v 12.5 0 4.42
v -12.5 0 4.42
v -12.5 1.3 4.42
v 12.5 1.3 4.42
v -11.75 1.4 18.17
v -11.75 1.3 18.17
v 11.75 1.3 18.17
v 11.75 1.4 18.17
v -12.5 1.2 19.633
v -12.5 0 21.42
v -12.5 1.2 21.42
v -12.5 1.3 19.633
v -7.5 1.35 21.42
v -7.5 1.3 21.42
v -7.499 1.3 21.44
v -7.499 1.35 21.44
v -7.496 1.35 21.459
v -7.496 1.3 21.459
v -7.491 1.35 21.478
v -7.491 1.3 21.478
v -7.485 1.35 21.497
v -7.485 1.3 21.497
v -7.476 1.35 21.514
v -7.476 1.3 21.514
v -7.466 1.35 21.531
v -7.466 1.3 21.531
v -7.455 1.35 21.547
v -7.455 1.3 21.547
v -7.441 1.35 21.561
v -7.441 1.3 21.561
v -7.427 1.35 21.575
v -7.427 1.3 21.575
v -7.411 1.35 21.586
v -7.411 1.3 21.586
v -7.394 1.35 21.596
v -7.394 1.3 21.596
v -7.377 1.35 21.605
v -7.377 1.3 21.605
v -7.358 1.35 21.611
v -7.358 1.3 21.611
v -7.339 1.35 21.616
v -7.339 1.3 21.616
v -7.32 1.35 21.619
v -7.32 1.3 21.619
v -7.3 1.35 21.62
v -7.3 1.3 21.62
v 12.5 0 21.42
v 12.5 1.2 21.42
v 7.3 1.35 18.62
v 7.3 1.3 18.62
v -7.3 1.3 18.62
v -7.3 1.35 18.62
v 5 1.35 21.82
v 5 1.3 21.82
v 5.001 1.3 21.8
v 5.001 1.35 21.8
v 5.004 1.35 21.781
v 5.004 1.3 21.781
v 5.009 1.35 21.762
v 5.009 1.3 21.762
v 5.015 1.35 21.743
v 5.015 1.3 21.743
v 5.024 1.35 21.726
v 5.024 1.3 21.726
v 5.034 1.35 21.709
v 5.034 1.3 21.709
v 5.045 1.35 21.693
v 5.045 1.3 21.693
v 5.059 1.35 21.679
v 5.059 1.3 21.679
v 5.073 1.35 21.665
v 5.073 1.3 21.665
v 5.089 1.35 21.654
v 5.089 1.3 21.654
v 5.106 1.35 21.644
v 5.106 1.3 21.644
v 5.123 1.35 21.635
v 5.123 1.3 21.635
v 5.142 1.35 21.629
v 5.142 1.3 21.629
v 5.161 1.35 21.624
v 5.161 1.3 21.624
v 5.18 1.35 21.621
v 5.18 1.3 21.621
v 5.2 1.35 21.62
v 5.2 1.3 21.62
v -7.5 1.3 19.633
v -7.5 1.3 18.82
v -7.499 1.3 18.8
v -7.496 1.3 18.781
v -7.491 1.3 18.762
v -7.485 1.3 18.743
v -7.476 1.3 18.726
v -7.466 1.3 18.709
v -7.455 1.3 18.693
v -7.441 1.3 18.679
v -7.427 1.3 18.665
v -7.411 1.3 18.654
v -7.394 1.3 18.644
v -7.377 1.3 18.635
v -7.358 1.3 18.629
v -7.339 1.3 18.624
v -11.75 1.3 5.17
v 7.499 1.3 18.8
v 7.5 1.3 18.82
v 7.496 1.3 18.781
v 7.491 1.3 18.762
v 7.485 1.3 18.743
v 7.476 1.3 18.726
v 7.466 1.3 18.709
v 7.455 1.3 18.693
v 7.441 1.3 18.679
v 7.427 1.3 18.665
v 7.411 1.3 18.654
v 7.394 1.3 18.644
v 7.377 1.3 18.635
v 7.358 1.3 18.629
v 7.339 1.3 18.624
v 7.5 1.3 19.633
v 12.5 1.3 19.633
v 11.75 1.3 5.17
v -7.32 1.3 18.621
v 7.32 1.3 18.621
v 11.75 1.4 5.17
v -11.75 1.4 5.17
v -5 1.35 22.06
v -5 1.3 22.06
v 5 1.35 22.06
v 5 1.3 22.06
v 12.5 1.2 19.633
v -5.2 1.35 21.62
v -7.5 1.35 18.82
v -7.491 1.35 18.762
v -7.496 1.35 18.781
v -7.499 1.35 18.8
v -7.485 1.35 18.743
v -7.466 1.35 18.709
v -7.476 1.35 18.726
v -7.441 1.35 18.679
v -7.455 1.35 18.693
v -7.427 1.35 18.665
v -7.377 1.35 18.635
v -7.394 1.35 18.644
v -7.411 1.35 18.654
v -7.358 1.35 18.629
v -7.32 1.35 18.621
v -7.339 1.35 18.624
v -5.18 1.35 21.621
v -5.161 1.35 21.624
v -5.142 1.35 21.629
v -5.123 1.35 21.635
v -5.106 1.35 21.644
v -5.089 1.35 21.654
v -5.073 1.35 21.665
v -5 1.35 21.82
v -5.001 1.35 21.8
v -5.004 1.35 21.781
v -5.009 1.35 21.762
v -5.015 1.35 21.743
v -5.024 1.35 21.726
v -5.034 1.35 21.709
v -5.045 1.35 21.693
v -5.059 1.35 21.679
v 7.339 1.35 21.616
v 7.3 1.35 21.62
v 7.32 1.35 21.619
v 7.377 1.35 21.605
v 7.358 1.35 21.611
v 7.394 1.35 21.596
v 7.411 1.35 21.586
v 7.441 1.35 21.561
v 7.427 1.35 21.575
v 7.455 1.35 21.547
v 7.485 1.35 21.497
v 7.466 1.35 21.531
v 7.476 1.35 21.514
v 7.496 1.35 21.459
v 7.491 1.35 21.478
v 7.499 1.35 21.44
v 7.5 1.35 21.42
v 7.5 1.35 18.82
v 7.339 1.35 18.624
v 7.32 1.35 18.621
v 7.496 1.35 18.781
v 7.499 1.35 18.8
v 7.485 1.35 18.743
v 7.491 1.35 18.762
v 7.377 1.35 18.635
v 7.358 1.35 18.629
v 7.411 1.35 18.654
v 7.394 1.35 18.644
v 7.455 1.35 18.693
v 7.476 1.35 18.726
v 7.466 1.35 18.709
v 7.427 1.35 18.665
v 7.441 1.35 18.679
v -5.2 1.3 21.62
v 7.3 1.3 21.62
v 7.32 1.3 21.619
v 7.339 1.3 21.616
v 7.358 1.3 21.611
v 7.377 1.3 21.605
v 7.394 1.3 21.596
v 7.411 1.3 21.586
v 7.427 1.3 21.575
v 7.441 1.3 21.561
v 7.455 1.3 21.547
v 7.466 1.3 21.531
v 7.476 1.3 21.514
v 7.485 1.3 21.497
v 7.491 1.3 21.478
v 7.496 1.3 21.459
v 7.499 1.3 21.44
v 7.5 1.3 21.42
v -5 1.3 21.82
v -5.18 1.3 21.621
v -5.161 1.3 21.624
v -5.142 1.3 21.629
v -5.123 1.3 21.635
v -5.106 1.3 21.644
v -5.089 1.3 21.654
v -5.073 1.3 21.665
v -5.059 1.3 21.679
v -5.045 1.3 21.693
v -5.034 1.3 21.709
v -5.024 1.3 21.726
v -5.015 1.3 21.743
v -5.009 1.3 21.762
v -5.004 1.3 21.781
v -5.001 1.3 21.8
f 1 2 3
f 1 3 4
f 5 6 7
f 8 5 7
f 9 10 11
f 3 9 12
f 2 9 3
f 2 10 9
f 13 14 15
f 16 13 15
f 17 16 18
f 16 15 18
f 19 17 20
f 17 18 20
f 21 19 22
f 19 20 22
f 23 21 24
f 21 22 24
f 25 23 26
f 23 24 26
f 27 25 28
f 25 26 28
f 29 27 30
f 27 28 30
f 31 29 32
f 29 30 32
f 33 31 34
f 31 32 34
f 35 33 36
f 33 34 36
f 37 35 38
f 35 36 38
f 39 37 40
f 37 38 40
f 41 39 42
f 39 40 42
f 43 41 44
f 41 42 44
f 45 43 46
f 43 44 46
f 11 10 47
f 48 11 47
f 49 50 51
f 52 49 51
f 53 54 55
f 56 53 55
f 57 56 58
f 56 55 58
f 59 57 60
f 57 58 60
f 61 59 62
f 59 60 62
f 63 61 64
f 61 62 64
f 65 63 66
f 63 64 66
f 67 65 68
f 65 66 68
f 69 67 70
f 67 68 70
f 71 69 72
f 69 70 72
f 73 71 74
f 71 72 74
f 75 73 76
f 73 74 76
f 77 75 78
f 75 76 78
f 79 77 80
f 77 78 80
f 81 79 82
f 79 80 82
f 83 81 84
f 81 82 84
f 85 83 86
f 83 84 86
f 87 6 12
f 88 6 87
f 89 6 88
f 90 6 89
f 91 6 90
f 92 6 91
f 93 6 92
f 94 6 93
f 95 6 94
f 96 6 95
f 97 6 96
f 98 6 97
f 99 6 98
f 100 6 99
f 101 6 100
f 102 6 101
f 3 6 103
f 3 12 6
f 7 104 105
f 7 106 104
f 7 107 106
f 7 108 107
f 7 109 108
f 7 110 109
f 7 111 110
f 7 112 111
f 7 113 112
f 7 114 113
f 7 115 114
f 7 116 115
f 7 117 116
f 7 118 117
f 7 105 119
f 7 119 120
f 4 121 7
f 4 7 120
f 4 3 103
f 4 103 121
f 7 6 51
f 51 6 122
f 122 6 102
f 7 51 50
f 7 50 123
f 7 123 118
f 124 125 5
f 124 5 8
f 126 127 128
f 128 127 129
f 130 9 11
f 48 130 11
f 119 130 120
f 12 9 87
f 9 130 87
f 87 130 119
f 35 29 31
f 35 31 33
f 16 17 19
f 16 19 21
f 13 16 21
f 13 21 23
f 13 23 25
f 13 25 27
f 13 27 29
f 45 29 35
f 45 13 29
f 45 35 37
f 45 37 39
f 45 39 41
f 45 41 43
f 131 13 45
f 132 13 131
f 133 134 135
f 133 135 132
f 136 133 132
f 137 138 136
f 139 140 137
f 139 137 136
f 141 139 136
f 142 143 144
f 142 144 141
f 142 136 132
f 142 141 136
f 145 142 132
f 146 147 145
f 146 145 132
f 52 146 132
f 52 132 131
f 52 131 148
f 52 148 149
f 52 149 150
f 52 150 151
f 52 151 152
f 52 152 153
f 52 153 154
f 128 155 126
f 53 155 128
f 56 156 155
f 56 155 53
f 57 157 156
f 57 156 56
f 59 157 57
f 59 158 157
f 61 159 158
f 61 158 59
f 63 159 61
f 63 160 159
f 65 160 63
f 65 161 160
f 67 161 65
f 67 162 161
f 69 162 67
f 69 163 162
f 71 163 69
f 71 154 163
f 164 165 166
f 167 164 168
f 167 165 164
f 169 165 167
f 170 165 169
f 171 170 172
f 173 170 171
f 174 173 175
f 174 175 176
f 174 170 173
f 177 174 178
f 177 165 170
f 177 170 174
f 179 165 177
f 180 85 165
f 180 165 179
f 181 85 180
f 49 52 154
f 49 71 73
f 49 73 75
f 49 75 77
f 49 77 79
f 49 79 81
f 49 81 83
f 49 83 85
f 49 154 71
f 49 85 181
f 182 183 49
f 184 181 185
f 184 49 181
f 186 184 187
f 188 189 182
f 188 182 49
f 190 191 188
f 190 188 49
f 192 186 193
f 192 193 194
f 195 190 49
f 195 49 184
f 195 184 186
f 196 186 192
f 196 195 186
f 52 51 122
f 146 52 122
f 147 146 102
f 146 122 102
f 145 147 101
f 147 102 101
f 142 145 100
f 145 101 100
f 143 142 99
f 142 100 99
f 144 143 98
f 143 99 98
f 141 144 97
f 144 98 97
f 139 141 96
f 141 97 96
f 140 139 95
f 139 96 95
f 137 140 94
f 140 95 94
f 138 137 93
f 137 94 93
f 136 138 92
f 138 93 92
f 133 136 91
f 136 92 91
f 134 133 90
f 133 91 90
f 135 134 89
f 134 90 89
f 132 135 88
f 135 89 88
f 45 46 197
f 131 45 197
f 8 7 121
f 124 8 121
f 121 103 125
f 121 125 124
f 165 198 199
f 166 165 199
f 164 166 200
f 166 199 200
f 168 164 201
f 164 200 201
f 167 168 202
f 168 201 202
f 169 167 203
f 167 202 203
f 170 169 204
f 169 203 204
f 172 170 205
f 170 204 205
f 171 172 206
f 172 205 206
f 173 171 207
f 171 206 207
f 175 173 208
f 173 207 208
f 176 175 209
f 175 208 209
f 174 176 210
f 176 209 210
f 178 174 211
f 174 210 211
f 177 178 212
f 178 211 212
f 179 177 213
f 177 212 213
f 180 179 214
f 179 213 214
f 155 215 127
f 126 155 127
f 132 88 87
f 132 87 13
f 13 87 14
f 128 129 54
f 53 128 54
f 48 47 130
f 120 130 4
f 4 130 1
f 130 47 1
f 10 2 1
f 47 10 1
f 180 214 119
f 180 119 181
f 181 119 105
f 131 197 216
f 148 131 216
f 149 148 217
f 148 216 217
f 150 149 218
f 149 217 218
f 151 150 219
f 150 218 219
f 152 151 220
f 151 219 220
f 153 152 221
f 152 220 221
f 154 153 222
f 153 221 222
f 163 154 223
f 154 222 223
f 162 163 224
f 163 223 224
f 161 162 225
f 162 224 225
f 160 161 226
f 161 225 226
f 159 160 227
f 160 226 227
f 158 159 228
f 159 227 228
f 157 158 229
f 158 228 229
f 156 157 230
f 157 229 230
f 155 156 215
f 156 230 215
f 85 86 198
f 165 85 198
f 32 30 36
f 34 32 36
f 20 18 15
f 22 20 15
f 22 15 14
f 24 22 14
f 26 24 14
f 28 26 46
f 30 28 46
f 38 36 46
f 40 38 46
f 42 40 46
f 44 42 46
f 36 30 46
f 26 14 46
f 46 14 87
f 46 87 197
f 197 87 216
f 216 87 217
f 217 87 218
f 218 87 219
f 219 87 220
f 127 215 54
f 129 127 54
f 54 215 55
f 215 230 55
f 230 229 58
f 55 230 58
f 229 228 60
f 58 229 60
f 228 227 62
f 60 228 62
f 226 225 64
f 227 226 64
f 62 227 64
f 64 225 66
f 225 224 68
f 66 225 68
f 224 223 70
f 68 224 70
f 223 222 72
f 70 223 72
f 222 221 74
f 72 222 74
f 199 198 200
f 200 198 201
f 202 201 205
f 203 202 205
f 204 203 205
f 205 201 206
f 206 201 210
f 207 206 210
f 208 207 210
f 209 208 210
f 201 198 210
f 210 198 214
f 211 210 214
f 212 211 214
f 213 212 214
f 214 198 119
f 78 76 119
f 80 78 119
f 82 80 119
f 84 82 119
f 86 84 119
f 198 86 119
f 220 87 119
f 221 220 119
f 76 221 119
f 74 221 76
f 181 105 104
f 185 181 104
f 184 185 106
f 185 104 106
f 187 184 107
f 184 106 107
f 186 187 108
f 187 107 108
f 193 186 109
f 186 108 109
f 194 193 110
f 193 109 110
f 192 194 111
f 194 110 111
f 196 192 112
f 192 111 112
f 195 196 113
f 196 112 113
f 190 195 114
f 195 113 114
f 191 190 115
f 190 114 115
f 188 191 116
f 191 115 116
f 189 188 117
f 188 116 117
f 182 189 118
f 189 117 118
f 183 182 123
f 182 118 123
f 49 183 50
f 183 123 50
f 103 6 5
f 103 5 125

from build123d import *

# Parameters (mm, degrees)
SKETCH3_W           = 25
SKETCH3_H           = 17
BOSS_EXTRUDE3_DEPTH = 1.3
SKETCH4_W           = 4.047255343
SKETCH4_H           = 0.65
CUT_EXTRUDE1_DEPTH  = 30.3
SKETCH6_W           = 23.5
SKETCH6_H           = 13
BOSS_EXTRUDE4_DEPTH = 0.1
BOSS_EXTRUDE6_DEPTH = 0.05


with BuildPart() as part:
    # Sketch3 → Boss-Extrude3 (new body)
    with BuildSketch(Plane(origin=(0, 0, 0), x_dir=(1, 0, 0), z_dir=(0, 1, 0))):
        with Locations((0, -12.92)):
            Rectangle(SKETCH3_W, SKETCH3_H)
    extrude(amount=BOSS_EXTRUDE3_DEPTH)

    # Sketch4 → Cut-Extrude1 (cut)
    with BuildSketch(Plane.ZY.offset(12.5)):
        with Locations((21.656372328, 1.525)):
            Rectangle(SKETCH4_W, SKETCH4_H)
    extrude(amount=-CUT_EXTRUDE1_DEPTH, mode=Mode.SUBTRACT)

    # Sketch6 → Boss-Extrude4 (add)
    with BuildSketch(Plane(origin=(0, 1.3, 0), x_dir=(1, 0, 0), z_dir=(0, 1, 0))):
        with Locations((0, -11.67)):
            Rectangle(SKETCH6_W, SKETCH6_H)
    extrude(amount=BOSS_EXTRUDE4_DEPTH)

    # Sketch10 → Boss-Extrude6 (add)
    with BuildSketch(Plane(origin=(0, 1.3, 0), x_dir=(1, 0, 0), z_dir=(0, 1, 0))):
        with BuildLine():
            Line((-5, -21.82), (-5, -22.06))
            Line((-5, -22.06), (5, -22.06))
            Line((5, -22.06), (5, -21.82))
            ThreePointArc((5, -21.82), (5.058578644, -21.678578644), (5.2, -21.62))
            Line((5.2, -21.62), (7.3, -21.62))
            ThreePointArc((7.3, -21.62), (7.441421356, -21.561421356), (7.5, -21.42))
            Line((7.5, -21.42), (7.5, -18.82))
            ThreePointArc((7.5, -18.82), (7.441421356, -18.678578644), (7.3, -18.62))
            Line((7.3, -18.62), (-7.3, -18.62))
            ThreePointArc((-7.3, -18.62), (-7.441421356, -18.678578644), (-7.5, -18.82))
            Line((-7.5, -18.82), (-7.5, -21.42))
            ThreePointArc((-7.5, -21.42), (-7.441421356, -21.561421356), (-7.3, -21.62))
            Line((-7.3, -21.62), (-5.2, -21.62))
            ThreePointArc((-5.2, -21.62), (-5.058578644, -21.678578644), (-5, -21.82))
        make_face()
    extrude(amount=BOSS_EXTRUDE6_DEPTH)


solid = part.part
